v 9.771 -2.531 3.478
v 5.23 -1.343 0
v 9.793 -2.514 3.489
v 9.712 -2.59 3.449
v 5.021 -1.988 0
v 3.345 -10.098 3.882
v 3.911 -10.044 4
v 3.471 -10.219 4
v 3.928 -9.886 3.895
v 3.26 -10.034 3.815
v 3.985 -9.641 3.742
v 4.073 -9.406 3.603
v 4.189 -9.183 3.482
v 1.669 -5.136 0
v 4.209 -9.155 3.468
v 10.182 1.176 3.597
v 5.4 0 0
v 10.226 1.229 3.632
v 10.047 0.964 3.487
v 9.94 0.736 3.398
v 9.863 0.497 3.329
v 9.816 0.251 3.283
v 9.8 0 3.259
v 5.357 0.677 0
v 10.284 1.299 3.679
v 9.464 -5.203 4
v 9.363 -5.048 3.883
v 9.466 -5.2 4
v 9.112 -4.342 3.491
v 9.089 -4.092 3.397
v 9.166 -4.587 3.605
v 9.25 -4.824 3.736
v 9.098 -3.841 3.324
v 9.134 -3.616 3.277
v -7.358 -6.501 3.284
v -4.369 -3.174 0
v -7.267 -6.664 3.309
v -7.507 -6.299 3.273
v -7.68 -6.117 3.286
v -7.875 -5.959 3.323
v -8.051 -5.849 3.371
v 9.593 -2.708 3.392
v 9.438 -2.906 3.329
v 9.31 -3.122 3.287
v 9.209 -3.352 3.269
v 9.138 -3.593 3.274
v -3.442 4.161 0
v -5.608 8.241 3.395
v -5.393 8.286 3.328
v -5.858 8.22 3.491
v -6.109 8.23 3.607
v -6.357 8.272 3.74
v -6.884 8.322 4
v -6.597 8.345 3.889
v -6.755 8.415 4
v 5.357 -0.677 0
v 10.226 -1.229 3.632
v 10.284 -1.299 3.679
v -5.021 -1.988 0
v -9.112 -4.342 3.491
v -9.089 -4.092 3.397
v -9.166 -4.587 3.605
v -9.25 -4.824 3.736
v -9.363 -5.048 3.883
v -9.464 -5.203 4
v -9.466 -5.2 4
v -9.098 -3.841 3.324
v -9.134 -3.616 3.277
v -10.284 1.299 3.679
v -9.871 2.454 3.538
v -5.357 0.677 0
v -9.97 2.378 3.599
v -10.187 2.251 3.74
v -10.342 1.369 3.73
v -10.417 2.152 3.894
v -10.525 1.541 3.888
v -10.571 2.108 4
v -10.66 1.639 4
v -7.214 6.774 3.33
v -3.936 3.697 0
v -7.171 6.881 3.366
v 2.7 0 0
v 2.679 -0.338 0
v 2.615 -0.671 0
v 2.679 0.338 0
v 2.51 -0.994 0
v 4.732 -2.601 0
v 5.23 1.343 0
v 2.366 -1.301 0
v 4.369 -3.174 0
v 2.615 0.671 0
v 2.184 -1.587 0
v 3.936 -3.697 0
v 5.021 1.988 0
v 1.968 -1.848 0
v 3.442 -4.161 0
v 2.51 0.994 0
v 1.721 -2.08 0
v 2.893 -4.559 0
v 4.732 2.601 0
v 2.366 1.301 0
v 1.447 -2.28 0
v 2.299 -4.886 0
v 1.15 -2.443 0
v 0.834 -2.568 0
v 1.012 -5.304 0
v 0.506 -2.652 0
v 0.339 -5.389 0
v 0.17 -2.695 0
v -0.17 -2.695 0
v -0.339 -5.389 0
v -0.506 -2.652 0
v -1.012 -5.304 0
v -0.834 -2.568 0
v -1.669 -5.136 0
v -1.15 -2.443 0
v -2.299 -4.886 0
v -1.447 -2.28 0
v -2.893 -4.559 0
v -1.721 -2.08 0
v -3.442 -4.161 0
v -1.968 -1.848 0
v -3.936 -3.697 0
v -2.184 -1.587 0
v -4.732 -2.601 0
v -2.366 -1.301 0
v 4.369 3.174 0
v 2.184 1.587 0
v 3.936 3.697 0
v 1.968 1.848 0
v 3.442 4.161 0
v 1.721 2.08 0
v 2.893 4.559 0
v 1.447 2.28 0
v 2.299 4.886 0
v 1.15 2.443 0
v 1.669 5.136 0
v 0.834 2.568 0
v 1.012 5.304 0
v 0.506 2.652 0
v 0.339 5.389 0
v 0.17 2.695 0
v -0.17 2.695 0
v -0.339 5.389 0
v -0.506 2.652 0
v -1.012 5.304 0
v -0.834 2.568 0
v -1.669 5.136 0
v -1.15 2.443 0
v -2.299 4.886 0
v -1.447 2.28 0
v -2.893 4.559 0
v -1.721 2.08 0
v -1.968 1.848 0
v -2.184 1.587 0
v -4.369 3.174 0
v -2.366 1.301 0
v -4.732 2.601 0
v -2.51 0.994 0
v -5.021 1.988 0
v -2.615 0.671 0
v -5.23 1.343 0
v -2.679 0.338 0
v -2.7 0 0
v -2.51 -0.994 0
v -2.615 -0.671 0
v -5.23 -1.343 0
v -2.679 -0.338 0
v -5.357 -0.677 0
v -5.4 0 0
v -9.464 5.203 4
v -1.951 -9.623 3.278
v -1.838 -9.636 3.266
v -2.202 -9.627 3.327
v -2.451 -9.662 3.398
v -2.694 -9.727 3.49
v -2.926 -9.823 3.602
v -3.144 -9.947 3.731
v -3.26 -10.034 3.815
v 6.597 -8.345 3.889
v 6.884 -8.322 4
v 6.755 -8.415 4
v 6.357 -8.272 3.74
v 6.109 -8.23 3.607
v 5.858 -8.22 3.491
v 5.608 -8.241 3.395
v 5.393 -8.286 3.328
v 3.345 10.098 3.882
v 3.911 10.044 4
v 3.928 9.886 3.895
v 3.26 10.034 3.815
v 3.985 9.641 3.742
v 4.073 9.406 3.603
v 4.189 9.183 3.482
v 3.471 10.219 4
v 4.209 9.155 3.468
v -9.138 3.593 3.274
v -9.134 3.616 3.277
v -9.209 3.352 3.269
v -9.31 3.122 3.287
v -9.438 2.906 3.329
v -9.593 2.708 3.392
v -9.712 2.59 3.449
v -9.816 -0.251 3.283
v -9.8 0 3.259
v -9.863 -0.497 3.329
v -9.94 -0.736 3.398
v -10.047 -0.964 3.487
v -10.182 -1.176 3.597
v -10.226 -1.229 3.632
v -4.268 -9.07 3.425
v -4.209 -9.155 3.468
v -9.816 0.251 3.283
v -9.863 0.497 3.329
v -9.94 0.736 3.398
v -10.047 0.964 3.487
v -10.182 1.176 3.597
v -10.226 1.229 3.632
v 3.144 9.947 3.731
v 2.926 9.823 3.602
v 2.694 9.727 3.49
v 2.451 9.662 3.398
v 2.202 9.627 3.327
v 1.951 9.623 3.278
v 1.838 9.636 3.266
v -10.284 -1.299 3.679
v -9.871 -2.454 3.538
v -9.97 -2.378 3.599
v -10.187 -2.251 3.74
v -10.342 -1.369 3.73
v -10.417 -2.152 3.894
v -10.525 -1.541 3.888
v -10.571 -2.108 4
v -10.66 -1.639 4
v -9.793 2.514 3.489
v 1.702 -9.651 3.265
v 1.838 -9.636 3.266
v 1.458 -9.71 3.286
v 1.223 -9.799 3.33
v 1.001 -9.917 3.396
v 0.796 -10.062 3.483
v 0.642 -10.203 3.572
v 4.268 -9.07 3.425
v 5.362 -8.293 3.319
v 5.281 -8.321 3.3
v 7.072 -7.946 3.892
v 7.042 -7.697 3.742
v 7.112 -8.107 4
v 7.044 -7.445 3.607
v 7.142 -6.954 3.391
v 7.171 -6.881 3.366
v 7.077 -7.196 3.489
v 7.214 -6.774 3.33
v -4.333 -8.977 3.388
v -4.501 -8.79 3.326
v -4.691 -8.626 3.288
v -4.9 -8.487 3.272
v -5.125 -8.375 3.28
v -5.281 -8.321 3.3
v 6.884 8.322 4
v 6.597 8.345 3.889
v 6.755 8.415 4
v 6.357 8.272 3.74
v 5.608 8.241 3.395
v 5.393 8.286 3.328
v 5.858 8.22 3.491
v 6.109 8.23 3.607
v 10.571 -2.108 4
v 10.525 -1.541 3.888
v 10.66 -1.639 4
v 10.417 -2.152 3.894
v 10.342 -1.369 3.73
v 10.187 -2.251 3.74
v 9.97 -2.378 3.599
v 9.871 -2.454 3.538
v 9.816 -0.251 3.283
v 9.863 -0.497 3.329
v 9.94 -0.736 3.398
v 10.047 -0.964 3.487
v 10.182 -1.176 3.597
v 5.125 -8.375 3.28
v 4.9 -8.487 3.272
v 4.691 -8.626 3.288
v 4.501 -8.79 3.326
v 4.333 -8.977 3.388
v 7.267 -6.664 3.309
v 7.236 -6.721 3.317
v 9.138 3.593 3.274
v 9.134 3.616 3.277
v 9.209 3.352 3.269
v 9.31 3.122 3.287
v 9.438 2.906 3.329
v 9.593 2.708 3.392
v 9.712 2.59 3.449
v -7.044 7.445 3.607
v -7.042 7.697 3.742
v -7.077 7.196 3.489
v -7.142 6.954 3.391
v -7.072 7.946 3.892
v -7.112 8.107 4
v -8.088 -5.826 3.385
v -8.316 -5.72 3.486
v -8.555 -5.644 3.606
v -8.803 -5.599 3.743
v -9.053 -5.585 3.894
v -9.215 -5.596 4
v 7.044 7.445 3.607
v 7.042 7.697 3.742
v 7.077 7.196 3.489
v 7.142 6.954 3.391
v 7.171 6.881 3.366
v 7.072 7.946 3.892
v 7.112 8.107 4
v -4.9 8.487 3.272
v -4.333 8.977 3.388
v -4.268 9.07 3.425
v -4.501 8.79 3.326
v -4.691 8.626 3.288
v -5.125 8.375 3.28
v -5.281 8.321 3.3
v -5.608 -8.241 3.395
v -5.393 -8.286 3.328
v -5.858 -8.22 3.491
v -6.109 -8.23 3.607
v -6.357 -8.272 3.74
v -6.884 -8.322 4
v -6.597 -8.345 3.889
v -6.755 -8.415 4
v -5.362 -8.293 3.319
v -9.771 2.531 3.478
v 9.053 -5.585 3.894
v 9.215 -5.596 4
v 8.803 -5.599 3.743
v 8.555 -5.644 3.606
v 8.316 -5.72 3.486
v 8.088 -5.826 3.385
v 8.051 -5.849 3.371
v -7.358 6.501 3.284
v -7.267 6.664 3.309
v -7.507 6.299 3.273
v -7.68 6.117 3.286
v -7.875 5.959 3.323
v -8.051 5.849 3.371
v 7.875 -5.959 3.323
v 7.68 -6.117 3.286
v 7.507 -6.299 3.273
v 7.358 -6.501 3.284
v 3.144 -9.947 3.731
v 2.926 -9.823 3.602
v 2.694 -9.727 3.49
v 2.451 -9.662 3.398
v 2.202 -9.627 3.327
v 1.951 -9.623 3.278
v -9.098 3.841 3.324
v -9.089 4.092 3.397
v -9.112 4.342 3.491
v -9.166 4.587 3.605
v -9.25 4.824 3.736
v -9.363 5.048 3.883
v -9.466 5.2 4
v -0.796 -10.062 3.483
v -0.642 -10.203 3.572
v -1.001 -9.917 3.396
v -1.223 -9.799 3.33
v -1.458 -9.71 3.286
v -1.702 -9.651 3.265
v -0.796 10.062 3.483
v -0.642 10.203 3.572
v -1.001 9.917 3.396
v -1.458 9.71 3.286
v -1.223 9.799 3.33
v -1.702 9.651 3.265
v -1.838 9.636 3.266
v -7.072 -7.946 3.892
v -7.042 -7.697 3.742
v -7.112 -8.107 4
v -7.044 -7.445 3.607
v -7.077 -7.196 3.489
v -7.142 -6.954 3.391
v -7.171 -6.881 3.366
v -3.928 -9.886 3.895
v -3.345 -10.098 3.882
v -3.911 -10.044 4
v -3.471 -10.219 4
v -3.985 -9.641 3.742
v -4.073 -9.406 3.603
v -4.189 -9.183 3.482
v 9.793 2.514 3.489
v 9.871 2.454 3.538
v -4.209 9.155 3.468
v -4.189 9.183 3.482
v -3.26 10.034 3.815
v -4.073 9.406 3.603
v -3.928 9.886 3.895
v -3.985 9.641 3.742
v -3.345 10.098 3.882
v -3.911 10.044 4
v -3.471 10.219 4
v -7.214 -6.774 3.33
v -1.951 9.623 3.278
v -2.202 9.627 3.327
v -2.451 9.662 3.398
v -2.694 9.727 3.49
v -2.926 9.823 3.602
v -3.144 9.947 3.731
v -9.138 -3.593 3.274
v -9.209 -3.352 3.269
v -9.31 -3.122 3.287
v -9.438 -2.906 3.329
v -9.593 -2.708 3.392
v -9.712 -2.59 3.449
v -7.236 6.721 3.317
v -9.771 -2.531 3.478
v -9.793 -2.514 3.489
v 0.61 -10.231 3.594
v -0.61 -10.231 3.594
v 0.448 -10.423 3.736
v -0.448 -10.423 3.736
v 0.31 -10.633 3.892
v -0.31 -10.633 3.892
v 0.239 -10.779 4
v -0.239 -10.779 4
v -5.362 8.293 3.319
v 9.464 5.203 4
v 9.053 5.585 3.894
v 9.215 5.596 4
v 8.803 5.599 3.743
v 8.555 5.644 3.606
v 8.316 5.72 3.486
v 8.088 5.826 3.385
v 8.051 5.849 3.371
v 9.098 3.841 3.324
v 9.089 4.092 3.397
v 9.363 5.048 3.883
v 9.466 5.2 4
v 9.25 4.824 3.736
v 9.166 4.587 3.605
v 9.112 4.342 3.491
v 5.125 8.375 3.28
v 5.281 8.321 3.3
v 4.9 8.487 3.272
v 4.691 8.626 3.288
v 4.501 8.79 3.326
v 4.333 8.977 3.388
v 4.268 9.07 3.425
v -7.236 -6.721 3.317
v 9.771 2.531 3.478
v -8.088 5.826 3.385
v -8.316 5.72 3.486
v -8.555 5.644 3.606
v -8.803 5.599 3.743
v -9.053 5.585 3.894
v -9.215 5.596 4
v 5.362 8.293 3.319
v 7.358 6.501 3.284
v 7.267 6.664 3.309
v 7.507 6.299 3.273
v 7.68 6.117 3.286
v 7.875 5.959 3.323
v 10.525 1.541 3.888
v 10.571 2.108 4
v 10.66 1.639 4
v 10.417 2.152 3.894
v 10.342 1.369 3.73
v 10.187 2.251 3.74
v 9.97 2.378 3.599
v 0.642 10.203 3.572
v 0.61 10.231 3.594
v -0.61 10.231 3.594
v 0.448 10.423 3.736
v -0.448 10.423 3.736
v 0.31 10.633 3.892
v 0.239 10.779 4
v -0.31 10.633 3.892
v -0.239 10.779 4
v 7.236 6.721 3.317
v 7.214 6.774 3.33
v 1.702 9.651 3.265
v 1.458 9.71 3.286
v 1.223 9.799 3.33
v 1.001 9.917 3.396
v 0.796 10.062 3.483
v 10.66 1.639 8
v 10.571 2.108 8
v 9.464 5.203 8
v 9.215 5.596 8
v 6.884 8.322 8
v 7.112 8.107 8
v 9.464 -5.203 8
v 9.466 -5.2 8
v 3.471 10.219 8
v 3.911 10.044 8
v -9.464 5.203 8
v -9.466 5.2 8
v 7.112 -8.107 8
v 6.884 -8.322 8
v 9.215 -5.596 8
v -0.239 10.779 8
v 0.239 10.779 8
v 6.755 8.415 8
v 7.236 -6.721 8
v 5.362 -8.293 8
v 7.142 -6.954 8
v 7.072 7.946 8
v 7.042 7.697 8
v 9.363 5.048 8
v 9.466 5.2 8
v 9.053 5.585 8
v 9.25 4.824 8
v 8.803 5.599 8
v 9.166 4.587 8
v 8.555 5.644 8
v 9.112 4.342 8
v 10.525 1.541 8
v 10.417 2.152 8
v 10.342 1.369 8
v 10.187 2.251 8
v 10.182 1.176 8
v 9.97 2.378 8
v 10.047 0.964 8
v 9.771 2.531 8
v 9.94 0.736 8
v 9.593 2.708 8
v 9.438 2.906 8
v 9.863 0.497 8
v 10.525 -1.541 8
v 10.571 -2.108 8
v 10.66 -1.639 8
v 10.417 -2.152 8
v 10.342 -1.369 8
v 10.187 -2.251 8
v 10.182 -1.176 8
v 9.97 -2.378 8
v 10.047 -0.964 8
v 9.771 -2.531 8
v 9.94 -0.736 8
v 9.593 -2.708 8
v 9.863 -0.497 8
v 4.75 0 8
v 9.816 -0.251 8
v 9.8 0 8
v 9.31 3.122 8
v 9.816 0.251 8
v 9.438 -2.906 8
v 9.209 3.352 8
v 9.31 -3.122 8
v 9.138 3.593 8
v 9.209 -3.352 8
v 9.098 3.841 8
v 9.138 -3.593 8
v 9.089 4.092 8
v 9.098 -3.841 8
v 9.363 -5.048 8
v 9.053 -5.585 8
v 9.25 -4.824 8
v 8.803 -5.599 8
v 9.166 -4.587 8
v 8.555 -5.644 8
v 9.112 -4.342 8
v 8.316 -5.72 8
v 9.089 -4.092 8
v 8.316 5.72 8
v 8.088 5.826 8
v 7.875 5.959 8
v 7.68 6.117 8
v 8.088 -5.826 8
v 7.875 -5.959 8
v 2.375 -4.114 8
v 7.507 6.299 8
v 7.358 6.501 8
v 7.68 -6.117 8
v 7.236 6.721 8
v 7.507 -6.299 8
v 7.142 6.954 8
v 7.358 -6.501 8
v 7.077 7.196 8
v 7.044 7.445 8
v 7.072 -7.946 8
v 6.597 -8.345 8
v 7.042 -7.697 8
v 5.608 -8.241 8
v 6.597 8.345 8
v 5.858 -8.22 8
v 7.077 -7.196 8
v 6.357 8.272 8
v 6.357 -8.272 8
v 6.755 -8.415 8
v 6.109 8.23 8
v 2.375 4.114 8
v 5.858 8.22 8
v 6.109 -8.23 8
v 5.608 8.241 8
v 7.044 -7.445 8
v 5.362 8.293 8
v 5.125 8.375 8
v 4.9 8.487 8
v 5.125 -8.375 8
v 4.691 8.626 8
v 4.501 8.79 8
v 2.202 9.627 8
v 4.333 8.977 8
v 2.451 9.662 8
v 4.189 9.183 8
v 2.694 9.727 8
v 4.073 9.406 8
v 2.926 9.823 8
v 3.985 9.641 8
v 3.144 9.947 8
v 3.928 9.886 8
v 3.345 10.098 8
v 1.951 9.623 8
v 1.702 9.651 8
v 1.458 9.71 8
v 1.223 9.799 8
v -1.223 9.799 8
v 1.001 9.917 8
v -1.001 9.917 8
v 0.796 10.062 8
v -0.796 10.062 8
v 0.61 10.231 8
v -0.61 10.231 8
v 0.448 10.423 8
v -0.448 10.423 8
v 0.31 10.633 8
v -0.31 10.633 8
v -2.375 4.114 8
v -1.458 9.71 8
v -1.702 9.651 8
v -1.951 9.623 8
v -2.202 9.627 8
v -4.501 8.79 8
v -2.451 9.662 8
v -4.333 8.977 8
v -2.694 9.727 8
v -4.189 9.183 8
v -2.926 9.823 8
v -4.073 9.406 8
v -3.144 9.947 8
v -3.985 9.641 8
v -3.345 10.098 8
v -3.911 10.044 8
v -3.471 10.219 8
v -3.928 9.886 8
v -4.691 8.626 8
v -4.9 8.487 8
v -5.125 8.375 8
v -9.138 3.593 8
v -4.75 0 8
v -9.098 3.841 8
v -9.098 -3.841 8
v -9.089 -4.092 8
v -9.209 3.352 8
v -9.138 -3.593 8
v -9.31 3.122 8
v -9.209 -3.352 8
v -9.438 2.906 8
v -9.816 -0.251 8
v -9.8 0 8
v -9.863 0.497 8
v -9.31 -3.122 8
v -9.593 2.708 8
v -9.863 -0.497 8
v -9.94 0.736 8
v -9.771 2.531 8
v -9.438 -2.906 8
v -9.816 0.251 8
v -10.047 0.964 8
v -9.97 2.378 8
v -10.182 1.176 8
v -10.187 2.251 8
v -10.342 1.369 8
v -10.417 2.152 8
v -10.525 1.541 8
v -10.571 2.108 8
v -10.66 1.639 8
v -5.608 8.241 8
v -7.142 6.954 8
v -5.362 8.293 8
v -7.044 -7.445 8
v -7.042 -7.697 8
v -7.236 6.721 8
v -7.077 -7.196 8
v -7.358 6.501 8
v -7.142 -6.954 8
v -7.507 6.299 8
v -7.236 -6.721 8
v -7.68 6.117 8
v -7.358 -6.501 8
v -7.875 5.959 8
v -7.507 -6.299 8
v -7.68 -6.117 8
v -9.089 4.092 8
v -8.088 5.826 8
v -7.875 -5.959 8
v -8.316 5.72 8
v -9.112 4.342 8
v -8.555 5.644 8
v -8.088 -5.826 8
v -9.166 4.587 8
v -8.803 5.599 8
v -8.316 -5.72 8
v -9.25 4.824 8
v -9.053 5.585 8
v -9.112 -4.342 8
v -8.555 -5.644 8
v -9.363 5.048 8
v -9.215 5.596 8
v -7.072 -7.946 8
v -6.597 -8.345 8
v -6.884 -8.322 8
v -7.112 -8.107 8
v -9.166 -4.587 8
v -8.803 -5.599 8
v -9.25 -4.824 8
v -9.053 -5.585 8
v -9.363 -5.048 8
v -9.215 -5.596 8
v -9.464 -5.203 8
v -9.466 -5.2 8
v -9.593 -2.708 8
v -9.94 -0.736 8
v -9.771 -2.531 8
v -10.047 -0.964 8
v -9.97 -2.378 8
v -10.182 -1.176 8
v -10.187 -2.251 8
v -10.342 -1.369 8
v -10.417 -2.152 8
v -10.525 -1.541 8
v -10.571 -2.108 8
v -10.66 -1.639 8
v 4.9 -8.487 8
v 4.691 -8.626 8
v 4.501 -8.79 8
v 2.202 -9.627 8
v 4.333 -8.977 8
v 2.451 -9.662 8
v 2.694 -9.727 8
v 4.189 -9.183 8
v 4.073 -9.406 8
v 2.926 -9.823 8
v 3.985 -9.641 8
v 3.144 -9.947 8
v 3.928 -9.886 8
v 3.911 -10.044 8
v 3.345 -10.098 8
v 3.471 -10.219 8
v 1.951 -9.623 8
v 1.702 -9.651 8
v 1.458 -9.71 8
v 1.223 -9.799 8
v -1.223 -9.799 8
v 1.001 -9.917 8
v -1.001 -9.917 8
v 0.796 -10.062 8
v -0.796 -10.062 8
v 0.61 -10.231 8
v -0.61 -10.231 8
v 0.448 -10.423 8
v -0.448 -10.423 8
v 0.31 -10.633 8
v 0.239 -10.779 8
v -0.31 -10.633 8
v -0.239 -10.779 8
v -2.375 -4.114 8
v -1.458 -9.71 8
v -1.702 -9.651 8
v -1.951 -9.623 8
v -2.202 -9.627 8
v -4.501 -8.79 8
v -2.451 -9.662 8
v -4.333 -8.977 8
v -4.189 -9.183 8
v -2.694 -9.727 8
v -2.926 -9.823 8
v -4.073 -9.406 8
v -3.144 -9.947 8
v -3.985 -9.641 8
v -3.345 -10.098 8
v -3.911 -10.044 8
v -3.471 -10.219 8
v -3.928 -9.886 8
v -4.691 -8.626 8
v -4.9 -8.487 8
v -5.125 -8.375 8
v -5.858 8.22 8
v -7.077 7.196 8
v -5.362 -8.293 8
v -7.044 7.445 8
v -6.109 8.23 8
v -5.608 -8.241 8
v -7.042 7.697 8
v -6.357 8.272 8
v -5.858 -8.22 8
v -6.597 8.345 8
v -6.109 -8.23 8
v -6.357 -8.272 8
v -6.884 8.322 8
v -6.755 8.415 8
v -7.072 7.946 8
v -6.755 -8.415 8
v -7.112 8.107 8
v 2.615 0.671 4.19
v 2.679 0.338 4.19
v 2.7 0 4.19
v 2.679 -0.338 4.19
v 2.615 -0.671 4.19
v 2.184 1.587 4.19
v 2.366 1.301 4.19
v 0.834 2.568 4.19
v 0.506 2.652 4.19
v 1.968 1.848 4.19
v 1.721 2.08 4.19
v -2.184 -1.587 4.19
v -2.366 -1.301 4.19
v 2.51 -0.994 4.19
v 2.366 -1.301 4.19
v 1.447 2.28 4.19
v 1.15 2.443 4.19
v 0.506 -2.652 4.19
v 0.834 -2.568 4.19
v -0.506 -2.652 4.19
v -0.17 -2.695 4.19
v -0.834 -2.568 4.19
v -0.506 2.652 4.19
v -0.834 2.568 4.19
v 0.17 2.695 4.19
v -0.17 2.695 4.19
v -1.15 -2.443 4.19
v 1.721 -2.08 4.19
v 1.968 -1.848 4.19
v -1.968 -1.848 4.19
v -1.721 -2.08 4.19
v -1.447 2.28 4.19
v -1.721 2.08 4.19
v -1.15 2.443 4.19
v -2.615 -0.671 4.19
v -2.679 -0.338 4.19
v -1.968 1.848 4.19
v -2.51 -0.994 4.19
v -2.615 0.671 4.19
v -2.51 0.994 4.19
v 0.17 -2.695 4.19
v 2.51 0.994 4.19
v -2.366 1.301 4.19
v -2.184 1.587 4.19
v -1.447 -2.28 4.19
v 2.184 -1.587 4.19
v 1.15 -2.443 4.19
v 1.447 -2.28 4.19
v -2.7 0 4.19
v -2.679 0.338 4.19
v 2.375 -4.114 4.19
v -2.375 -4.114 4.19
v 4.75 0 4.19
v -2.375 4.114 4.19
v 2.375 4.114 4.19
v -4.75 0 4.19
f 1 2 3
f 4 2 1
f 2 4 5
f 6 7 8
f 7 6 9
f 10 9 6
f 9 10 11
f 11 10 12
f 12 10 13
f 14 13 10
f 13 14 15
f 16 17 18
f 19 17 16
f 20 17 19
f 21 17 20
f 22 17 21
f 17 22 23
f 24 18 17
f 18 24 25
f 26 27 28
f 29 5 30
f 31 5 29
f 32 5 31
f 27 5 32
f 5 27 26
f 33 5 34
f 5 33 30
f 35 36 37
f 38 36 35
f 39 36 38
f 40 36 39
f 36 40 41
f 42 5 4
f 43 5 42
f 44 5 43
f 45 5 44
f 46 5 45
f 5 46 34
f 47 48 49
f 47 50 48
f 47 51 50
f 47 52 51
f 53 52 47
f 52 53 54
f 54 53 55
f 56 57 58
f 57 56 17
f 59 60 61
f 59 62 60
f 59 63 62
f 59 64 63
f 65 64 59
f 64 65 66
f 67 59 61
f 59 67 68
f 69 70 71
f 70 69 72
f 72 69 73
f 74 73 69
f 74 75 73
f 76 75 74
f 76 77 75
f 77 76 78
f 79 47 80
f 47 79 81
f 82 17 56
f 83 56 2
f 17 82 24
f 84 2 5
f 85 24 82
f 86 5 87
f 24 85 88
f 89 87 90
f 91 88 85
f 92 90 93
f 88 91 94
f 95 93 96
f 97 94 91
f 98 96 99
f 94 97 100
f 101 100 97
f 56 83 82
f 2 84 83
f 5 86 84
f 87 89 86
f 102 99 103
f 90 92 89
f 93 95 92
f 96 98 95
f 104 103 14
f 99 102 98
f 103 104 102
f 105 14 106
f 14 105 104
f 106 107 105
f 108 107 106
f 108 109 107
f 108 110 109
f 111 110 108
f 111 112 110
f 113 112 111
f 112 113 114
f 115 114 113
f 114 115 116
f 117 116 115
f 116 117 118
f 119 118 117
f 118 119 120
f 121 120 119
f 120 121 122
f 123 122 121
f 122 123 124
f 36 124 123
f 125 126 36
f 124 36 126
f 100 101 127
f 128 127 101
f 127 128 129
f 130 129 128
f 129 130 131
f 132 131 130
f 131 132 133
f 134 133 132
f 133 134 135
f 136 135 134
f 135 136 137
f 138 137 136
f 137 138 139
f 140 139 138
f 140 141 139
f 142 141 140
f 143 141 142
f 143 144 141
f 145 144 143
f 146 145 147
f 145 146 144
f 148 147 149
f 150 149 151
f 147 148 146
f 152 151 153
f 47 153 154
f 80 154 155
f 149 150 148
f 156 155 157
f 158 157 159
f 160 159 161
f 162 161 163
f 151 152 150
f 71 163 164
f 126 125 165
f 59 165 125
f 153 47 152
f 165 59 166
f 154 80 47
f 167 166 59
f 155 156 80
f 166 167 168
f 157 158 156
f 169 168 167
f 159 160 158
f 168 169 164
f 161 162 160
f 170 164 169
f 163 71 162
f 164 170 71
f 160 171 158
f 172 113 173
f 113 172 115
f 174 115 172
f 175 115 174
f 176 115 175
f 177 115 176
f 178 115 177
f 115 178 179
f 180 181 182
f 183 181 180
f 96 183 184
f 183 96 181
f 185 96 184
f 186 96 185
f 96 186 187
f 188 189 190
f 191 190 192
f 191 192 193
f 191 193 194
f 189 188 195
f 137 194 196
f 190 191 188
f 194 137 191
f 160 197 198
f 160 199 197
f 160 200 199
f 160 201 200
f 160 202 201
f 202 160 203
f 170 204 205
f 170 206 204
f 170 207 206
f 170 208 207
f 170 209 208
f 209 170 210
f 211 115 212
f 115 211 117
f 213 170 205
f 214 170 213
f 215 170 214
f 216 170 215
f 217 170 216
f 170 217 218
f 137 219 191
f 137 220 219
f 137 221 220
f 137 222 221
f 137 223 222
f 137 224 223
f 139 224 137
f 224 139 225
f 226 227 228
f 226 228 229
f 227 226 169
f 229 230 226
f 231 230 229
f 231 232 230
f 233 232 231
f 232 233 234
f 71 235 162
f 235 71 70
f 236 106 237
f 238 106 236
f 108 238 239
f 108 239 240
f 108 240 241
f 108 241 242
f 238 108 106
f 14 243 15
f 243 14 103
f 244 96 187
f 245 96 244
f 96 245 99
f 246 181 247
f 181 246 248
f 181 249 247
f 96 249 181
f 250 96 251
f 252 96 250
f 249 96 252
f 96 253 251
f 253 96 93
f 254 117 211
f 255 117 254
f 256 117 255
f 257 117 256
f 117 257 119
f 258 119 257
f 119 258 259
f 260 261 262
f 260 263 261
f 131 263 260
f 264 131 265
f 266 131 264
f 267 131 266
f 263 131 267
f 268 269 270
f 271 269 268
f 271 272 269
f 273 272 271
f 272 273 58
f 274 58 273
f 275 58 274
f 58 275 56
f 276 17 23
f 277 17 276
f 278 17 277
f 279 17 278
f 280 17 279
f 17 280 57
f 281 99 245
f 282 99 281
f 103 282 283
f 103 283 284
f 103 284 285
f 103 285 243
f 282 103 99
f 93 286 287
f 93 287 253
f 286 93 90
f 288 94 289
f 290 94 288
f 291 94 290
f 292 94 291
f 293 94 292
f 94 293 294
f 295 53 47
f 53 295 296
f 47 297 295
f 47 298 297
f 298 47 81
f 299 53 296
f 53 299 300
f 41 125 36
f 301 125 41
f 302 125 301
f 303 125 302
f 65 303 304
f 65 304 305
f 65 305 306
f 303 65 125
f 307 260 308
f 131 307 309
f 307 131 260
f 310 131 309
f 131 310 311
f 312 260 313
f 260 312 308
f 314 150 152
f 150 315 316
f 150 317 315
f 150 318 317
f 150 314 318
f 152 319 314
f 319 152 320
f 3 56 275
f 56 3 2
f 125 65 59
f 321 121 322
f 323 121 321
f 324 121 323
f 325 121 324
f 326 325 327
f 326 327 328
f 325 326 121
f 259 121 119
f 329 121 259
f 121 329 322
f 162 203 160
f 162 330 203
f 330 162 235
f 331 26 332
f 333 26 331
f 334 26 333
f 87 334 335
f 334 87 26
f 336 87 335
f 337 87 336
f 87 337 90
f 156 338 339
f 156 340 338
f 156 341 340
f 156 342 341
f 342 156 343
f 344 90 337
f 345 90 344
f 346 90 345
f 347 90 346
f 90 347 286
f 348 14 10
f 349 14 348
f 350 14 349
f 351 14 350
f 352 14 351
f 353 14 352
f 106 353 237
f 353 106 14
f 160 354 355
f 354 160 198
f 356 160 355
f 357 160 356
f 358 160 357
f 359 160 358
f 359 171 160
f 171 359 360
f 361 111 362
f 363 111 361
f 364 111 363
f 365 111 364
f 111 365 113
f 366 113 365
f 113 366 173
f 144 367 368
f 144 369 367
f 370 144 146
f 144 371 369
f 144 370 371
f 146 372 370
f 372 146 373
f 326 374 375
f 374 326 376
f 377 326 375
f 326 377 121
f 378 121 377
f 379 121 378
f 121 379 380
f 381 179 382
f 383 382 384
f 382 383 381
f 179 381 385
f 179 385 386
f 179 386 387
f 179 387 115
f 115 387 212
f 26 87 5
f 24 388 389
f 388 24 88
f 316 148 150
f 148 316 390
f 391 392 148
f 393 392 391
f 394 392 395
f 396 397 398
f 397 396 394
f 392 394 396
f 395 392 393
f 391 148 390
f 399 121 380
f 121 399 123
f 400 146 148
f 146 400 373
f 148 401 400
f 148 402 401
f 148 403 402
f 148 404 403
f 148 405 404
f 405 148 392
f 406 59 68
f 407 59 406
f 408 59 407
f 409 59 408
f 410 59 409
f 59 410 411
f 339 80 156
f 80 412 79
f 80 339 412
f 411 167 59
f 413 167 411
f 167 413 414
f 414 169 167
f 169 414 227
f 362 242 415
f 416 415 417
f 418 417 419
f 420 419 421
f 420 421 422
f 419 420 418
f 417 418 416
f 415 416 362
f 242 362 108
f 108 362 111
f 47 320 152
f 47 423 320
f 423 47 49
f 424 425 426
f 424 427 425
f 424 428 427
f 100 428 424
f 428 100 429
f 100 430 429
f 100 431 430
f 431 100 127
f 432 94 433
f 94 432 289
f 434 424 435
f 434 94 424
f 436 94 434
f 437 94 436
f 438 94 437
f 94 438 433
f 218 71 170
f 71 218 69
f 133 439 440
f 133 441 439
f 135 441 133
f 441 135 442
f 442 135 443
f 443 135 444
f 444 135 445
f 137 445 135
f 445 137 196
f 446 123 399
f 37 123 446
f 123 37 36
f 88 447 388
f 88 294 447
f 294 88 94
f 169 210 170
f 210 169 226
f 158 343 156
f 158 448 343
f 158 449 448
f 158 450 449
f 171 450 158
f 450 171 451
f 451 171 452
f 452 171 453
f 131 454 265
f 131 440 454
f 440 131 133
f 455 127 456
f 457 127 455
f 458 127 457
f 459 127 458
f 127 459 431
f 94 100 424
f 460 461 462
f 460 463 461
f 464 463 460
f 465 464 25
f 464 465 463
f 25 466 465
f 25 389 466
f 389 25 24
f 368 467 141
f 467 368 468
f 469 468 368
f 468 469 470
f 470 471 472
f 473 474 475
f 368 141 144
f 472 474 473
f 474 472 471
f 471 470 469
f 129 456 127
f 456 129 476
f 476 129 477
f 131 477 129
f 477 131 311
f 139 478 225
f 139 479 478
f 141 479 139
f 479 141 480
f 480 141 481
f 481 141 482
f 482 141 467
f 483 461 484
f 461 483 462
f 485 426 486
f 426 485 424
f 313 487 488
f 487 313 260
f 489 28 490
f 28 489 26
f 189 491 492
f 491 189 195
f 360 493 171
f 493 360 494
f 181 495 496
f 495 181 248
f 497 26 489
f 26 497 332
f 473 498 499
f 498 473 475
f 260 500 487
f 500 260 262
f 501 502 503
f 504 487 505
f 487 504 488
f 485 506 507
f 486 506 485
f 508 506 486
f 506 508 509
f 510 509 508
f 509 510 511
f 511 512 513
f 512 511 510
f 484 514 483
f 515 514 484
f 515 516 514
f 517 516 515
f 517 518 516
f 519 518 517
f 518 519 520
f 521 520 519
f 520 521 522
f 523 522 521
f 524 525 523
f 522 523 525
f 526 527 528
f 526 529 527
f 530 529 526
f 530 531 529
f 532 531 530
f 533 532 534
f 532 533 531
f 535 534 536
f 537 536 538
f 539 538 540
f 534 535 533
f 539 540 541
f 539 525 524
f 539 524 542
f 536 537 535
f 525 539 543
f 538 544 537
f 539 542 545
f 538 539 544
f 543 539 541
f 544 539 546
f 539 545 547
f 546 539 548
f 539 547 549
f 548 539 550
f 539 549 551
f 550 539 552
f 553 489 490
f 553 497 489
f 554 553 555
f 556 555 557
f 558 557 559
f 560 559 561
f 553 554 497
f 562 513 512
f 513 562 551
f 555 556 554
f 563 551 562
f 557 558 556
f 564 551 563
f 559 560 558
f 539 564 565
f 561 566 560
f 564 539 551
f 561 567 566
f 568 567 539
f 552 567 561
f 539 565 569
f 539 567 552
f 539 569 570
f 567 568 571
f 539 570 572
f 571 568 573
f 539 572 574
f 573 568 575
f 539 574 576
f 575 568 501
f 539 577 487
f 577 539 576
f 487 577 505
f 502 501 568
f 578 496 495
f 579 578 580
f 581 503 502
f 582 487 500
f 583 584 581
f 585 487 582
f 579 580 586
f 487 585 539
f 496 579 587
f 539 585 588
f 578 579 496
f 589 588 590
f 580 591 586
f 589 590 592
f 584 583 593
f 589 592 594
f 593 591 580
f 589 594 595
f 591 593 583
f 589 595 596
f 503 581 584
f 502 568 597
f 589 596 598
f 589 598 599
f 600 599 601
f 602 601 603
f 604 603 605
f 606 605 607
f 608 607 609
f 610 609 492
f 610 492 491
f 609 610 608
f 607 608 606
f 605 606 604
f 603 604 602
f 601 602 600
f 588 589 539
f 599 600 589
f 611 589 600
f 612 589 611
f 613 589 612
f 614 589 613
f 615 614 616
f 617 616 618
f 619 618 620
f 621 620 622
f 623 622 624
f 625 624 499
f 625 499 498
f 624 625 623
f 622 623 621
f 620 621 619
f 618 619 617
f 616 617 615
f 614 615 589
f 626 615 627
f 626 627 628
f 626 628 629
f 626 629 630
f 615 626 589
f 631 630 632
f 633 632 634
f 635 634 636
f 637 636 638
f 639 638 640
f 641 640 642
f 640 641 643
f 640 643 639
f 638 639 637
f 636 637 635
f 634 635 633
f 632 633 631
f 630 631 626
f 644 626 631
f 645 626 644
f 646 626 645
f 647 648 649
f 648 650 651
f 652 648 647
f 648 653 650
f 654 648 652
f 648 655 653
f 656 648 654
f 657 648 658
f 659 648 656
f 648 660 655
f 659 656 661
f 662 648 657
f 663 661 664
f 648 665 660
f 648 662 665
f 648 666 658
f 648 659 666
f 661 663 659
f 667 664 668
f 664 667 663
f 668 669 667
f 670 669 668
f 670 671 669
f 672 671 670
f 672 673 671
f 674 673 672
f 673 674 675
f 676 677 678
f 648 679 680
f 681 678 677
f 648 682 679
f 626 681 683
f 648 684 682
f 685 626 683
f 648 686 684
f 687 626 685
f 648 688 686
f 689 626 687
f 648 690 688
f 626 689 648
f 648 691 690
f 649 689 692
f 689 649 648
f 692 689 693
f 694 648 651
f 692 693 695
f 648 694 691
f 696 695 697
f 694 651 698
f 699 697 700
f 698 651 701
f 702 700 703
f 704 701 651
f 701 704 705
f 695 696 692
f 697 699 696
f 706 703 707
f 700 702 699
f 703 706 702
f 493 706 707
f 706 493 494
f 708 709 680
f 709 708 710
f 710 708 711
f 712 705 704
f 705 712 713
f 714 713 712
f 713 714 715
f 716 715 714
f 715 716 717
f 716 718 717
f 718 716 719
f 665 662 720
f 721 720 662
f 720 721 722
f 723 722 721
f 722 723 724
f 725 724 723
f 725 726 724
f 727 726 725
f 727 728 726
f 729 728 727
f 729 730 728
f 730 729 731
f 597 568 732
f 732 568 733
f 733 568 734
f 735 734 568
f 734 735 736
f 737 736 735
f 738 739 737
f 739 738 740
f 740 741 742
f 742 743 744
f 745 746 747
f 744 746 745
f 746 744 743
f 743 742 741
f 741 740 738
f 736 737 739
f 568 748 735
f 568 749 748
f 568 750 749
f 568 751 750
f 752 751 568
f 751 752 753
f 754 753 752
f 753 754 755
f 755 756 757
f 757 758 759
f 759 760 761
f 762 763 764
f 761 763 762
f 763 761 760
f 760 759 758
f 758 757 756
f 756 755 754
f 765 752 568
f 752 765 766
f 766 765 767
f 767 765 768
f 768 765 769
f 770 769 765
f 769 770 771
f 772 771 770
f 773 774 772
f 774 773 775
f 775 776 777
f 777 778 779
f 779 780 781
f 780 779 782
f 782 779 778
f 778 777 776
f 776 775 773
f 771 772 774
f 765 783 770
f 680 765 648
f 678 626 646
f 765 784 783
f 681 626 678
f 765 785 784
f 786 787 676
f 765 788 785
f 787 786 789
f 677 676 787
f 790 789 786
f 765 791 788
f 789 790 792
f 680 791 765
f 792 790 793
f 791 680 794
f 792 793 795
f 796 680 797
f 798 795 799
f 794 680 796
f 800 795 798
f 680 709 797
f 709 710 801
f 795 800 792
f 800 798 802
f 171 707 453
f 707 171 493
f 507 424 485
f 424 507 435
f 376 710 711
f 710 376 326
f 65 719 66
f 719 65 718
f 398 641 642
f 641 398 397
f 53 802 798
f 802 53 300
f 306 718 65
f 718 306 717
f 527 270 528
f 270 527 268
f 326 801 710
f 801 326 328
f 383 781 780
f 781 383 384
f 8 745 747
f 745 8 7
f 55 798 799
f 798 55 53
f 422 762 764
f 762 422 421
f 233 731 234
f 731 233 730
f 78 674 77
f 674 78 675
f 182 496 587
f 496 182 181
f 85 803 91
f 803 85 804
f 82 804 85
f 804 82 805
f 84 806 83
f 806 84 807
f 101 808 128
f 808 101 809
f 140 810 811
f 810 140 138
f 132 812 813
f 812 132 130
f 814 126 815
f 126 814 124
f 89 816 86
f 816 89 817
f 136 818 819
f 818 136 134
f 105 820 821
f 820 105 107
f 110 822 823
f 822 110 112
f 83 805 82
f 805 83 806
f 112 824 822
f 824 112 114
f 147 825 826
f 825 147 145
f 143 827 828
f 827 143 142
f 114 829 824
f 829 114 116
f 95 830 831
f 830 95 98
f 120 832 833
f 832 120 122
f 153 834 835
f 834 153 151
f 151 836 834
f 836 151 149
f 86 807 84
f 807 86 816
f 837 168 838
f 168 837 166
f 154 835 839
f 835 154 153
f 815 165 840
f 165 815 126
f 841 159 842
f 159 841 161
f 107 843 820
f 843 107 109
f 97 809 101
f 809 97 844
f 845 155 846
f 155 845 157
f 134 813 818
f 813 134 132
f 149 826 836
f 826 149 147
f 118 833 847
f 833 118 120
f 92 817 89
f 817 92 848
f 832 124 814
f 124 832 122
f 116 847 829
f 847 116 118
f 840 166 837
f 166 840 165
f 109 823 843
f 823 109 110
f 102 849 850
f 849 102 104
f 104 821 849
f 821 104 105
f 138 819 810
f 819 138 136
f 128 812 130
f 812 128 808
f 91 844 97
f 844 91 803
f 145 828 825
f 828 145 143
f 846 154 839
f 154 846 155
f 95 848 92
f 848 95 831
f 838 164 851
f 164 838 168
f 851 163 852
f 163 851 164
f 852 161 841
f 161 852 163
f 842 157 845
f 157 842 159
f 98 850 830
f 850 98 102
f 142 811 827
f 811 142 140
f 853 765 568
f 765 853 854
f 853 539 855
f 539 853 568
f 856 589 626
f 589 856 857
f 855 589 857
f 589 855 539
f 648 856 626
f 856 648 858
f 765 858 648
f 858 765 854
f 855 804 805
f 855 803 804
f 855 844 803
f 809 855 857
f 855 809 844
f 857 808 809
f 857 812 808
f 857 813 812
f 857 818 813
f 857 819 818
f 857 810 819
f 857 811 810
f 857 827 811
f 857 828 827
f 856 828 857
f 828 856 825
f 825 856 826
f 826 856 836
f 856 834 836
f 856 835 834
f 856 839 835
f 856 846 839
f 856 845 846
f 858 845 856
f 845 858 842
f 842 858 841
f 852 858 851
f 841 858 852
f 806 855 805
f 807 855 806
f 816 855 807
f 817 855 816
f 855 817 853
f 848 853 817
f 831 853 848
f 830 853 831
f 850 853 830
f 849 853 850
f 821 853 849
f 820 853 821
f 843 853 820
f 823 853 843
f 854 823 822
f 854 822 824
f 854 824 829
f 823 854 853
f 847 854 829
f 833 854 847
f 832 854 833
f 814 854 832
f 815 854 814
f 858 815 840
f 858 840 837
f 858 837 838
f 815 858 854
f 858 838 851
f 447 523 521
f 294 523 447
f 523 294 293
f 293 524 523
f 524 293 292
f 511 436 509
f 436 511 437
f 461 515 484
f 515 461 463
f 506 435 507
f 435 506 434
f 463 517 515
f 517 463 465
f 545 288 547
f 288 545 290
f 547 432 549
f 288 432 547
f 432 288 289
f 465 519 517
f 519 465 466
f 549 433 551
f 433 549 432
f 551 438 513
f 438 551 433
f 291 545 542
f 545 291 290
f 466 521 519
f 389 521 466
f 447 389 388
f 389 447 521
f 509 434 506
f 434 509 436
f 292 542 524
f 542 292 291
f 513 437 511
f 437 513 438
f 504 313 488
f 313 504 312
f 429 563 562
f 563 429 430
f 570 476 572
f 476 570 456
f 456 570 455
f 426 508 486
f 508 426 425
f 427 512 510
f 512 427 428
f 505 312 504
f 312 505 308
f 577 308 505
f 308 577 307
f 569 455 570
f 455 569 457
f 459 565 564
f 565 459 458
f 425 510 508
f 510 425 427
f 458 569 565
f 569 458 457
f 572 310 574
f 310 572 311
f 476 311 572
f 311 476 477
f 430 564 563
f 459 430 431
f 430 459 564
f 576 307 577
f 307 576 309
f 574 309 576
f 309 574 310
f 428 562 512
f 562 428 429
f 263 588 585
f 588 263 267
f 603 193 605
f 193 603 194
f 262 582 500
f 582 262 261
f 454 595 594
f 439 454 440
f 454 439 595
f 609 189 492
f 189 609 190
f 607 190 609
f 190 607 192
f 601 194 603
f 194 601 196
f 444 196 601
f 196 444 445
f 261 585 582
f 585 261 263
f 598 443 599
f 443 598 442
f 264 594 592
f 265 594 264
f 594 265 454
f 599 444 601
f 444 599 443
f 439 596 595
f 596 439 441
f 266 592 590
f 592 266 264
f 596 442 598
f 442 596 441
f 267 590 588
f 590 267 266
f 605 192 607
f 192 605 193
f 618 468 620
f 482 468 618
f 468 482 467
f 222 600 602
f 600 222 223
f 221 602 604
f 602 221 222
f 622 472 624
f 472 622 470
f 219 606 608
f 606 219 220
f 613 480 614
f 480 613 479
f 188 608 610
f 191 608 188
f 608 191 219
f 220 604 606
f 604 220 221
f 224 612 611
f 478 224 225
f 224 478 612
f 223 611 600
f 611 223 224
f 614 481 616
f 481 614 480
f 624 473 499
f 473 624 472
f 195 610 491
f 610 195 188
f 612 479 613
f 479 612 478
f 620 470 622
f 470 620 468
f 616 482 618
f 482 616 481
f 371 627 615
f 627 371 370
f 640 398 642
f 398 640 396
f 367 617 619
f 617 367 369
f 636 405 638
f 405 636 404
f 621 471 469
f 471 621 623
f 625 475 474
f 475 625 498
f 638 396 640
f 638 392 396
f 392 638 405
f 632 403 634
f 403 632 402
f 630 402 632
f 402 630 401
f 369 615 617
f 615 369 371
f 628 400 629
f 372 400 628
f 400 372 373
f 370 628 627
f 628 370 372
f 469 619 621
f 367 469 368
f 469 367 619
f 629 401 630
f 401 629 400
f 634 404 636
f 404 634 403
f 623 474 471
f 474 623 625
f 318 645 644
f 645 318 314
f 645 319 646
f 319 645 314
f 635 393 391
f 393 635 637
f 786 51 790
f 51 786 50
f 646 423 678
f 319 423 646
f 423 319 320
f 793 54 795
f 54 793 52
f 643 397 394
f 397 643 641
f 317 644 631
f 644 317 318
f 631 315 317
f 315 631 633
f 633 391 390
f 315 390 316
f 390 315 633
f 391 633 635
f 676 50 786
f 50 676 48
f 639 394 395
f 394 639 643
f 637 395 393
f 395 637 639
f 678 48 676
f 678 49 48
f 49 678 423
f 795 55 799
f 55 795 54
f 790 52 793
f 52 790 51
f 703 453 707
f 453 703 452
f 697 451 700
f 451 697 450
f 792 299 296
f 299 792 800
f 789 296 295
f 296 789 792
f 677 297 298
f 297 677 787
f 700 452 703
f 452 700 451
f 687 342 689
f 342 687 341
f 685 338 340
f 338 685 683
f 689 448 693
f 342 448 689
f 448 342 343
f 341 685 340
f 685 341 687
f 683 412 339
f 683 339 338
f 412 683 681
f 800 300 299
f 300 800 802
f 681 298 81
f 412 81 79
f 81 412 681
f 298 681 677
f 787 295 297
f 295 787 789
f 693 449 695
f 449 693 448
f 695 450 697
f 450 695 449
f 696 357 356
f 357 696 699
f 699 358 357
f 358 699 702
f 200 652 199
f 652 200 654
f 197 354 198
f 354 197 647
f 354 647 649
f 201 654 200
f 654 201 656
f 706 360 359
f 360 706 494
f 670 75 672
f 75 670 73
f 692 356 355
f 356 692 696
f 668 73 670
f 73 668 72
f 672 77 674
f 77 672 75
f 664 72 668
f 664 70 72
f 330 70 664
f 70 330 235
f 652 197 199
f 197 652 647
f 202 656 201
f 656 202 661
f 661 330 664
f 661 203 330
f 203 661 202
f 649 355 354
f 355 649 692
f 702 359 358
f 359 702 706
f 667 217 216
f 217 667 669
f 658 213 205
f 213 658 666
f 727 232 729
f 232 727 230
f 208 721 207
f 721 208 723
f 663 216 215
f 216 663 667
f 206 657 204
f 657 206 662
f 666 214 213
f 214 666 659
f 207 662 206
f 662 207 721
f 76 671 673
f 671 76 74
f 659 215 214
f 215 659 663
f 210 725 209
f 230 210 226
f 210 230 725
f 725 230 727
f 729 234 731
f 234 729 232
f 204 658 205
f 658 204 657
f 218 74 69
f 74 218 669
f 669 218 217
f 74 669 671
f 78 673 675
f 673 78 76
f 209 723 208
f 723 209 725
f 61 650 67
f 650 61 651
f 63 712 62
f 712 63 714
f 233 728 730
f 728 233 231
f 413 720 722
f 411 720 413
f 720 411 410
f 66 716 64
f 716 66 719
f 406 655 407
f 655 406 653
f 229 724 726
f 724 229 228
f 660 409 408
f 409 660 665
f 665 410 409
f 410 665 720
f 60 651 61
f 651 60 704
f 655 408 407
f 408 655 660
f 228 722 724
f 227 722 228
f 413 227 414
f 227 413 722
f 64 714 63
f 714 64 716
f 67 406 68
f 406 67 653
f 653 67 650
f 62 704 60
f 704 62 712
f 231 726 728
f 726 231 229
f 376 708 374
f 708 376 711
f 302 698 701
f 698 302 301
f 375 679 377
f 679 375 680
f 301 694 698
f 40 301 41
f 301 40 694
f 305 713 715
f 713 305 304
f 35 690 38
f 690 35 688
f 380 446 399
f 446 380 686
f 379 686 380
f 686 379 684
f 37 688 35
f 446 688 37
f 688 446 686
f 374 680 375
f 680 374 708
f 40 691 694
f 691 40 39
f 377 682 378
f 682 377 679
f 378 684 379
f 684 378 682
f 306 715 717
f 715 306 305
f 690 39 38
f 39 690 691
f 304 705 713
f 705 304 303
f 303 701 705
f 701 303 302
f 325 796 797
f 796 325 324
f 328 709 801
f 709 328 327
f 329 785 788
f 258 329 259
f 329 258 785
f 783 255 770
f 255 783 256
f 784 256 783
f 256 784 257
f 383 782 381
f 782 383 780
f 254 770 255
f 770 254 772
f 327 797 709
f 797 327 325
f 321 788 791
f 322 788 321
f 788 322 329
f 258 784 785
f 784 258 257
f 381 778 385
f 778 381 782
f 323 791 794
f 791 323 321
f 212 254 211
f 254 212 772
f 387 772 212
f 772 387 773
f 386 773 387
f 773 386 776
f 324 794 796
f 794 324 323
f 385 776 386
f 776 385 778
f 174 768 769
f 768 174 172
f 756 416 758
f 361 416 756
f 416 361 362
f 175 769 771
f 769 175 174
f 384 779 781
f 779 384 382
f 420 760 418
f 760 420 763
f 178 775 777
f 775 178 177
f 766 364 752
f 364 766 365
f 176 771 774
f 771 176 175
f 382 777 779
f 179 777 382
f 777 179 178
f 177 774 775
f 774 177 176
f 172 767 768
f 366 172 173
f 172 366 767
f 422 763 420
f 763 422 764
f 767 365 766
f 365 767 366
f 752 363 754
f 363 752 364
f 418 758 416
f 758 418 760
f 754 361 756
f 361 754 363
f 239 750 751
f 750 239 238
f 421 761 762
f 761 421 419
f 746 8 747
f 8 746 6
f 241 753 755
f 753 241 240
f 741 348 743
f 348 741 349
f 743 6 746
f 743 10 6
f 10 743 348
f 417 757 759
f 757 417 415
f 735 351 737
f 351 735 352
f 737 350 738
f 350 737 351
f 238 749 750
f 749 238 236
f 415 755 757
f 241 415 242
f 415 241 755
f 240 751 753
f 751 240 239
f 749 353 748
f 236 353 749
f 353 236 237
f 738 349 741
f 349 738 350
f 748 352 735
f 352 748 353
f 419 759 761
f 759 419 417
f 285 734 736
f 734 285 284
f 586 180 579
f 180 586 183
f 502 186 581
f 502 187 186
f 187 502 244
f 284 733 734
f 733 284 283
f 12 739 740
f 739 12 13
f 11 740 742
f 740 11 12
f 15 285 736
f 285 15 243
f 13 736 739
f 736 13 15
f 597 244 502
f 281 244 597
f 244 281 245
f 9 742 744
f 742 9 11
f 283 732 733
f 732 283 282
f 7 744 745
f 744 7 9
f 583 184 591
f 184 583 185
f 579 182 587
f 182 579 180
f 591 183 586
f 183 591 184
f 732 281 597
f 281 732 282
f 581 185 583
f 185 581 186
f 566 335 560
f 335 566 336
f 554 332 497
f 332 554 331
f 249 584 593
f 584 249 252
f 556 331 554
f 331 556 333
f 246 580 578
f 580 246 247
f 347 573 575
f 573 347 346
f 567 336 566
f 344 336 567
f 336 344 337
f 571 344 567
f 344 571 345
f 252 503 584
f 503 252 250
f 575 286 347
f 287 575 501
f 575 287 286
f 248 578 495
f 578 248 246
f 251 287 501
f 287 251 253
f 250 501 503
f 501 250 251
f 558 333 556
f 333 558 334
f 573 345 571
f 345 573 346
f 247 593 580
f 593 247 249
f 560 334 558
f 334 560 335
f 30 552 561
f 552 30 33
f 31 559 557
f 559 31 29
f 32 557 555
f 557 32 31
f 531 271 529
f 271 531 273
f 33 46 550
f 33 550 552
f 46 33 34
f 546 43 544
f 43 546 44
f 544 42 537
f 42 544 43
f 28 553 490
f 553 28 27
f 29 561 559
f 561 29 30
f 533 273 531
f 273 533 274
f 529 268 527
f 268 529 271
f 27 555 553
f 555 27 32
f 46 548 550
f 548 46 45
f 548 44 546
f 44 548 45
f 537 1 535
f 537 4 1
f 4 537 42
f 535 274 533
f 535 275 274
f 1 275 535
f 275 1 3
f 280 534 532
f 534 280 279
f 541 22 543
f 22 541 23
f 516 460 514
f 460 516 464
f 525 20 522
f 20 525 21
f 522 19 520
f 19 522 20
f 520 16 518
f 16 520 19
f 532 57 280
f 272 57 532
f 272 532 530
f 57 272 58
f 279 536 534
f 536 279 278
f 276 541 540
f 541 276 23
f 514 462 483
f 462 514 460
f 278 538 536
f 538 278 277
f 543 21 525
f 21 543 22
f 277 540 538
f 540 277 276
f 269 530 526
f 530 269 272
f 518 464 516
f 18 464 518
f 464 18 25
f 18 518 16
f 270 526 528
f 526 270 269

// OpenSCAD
/********************************************************
This file is part of the RepRapPNP project, developed at the University of Hamburg.
Author: Florens Wasserfall <wasserfall@kalanka.de> 
License: 'GNU Affero General Public License AGPLv3 http://www.gnu.org/licenses/agpl.html' 
*******************************************************/

// general object resolution
$fn = 50;

//M3
// screw_dia = 3.5;
// nut_dia = 6.4;
// nut_height = 2.5;

//M4
/*screw_dia = 4.2;
nut_dia = 8.2;
nut_height = 4;
*/

//M5
screw_dia = 5.4;
nut_dia=9.5;
nut_height = 4;

//M8
/*screw_dia = 8.2;
nut_dia = 15;
nut_height = 6;
*/

dia = screw_dia*4;
base_height=nut_height;
//base_height=0;

//render grip
screw_grip();

module screw_grip() {
    difference() {
        union() {
            cylinder(r1=screw_dia, r2=dia/2, h=base_height, center=false);
            translate([0, 0, base_height]) cylinder(r=dia/2, h=nut_height, center=false);
        }
        translate([0, 0, base_height+0.2]) screw(screw_dia, 30, nut_dia, nut_height);

        for(i=[1:360/20]) {
                rotate([0, 0, i*20]) translate([dia/2+1,0,0]) cylinder(h=50, r=2, center=true);
            }
    }
}

module screw(screw_dia, length, nut_dia, nut_height) {
	translate([0, 0, -length/2]) {
		union() {
			//body
			cylinder(r=screw_dia/2, h=length, center=true);
			//nut
			translate([0, 0, length/2+nut_height/2-0.01]) {
				cylinder(r=nut_dia/2, h=nut_height, $fn=6, center=true);
			}
		}
	}
}
